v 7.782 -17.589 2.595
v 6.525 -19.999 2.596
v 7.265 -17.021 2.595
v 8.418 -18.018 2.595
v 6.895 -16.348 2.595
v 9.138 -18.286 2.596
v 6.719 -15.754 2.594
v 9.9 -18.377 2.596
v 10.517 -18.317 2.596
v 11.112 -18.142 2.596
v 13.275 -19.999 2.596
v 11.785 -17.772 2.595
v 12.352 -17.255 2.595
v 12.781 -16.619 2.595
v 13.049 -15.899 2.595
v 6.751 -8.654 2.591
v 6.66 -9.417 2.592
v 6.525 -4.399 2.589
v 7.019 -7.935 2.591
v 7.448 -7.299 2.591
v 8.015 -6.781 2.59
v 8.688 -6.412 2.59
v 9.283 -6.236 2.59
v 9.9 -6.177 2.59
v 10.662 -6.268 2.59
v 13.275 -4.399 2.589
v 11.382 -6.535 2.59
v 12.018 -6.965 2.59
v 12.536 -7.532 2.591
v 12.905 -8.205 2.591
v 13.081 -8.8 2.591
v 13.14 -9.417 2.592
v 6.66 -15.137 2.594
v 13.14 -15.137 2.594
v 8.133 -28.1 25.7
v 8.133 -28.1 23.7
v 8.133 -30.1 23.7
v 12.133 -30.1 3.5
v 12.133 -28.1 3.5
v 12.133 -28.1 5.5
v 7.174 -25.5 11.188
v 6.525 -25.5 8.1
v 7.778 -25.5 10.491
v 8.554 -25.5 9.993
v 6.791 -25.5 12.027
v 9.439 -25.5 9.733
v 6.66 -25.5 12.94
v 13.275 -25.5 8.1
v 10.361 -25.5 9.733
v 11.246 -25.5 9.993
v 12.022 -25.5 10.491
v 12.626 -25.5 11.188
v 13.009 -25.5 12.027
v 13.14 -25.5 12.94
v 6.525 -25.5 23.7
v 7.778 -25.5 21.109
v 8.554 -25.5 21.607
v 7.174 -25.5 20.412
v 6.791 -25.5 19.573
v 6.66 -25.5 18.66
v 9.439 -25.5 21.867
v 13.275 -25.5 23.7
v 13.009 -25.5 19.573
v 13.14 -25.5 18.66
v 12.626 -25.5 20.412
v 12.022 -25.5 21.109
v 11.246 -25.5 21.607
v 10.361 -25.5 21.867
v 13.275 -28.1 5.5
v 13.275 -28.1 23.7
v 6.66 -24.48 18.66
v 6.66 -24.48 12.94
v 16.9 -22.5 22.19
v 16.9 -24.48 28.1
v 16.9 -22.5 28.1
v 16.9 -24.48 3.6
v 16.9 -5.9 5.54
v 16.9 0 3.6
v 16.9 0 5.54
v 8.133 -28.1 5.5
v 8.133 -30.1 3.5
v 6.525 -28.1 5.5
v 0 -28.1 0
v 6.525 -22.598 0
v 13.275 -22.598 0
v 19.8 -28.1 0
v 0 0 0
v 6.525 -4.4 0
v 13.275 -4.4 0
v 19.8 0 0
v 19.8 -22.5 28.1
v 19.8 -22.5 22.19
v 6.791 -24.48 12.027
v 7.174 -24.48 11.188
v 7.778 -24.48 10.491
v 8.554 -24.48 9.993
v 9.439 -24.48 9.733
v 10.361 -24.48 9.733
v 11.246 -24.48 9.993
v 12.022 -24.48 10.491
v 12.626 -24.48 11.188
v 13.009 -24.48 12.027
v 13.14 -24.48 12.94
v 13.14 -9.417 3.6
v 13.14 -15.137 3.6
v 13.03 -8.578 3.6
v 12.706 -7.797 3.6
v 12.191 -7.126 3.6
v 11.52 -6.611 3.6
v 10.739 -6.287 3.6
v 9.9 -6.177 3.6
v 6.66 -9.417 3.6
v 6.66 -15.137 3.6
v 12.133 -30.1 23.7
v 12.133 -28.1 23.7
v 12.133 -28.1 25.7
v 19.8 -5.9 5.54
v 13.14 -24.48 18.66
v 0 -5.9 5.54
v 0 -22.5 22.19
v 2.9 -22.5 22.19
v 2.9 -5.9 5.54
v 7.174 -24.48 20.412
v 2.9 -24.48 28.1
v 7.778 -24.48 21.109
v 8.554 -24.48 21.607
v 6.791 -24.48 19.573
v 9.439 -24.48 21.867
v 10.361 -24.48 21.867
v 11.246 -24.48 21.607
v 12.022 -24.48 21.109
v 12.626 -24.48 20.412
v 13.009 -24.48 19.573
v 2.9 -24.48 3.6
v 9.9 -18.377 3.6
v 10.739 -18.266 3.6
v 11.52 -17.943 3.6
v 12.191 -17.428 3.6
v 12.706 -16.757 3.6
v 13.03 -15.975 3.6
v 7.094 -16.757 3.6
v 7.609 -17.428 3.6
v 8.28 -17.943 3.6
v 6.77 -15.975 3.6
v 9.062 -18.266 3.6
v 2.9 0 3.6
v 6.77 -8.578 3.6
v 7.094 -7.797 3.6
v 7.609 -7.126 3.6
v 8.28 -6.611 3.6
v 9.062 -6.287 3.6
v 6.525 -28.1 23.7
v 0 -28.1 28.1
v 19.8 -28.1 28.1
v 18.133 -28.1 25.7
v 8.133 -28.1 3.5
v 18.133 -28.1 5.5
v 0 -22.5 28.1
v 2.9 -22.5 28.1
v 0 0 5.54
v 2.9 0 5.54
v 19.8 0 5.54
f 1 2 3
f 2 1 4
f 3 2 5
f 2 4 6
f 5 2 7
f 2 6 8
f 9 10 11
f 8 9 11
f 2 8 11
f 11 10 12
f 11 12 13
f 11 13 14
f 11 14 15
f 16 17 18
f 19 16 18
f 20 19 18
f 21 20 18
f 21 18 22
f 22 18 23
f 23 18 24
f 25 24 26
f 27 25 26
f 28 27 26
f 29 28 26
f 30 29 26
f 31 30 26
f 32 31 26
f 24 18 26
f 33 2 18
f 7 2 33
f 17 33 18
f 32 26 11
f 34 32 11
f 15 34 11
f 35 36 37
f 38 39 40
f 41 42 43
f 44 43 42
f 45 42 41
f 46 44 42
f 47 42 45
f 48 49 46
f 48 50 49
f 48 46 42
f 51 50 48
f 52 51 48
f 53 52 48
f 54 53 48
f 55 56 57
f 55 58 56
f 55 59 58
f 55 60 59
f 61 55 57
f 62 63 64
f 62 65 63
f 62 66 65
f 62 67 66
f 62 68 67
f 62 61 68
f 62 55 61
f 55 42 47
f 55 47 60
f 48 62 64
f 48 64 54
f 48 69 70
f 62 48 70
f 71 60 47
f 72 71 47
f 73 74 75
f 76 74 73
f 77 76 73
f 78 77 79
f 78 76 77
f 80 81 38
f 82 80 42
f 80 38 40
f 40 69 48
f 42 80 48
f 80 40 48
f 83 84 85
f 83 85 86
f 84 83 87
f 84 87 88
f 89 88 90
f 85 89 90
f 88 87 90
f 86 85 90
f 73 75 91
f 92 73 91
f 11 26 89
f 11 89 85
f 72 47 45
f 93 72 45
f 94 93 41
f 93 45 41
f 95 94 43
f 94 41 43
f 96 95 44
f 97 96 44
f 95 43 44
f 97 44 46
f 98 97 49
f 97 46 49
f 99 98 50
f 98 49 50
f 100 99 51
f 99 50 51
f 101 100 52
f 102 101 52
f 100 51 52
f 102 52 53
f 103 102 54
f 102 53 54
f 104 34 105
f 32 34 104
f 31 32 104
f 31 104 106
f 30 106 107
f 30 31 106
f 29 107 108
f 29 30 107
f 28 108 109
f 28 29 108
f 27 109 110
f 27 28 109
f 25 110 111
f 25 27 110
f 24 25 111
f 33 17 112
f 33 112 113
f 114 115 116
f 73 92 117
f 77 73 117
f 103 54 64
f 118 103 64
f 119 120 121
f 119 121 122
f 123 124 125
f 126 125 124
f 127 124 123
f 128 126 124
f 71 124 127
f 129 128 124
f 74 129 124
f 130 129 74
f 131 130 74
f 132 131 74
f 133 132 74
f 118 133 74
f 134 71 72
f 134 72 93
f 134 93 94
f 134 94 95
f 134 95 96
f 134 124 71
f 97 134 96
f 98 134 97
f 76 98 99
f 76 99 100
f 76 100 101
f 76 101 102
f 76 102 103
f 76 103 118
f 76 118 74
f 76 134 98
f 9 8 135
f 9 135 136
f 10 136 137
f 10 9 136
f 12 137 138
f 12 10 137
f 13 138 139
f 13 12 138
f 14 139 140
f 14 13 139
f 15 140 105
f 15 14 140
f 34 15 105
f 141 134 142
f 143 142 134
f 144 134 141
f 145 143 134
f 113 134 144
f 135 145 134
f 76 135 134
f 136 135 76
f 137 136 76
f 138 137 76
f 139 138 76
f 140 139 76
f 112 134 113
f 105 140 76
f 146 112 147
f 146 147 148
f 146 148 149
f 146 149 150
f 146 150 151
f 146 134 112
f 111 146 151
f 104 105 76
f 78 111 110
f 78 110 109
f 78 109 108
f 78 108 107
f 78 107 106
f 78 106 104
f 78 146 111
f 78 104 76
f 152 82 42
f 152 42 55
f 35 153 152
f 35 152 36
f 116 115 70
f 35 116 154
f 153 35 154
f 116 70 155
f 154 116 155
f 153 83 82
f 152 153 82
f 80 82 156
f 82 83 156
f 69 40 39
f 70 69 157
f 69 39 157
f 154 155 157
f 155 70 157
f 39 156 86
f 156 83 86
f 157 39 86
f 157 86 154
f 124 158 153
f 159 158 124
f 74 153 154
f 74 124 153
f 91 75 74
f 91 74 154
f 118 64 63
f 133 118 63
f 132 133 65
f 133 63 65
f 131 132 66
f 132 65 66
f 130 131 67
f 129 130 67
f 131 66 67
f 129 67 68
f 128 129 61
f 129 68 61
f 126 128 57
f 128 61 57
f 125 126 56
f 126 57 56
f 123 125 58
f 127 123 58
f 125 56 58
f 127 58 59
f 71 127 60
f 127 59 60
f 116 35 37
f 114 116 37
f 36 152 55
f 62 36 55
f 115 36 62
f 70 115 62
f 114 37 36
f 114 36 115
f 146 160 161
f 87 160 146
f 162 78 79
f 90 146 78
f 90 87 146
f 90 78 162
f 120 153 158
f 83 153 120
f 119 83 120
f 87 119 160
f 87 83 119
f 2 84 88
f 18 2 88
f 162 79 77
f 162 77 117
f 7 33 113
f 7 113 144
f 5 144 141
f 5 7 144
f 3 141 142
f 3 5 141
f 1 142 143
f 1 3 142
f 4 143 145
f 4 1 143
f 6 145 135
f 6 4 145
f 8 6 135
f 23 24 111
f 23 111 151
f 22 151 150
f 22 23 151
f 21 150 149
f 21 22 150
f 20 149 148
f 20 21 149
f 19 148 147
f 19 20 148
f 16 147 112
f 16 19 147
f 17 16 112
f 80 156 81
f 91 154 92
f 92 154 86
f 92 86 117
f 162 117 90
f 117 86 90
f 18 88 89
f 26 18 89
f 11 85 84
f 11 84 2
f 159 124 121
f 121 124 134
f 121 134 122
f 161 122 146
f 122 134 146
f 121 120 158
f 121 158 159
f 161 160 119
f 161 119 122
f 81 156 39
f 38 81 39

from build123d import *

# Parameters (mm, degrees)
SKETCH_1_W          = 19.8
SKETCH_1_H          = 28.1
EXTRUDE_1_DEPTH     = 3.6
SKETCH_2_W          = 2.9
SKETCH_2_H          = 28.1
EXTRUDE_2_DEPTH     = 1.94
SKETCH_3_W          = 19.8
SKETCH_3_H          = 3.62
EXTRUDE_3_DEPTH     = 27.8
SKETCH_4_W          = 2.9
SKETCH_4_H          = 5.6
EXTRUDE_4_DEPTH     = 25.86
SKETCH_5_W          = 2.9
SKETCH_5_H          = 16.6
EXTRUDE_5_DEPTH     = 16.65
CUT_EXTRUDE_1_DEPTH = 3.3
CUT_EXTRUDE_2_DEPTH = 2.9
CUT_EXTRUDE_3_DEPTH = 2.9
SKETCH_11_W         = 6.75
SKETCH_11_H         = 15.6
CUT_EXTRUDE_4_DEPTH = 2.6
CUT_EXTRUDE_5_DEPTH = 6.75
CUT_EXTRUDE_6_DEPTH = 5
SKETCH_19_W         = 4
SKETCH_19_H         = 2
EXTRUDE_7_DEPTH     = 2
CUT_EXTRUDE_7_DEPTH = 10
CUT_EXTRUDE_8_DEPTH = 10


with BuildPart() as part:
    # 草图1 → 凸台-拉伸1 (new body)
    with BuildSketch(Plane.XY):
        with Locations((9.9, -14.05)):
            Rectangle(SKETCH_1_W, SKETCH_1_H)
    extrude(amount=EXTRUDE_1_DEPTH)

    # 草图2 → 凸台-拉伸2 (add)
    with BuildSketch(Plane.XY.offset(3.6)):
        with Locations((1.45, -14.05)):
            Rectangle(SKETCH_2_W, SKETCH_2_H)
        with Locations((18.35, -14.05)):
            Rectangle(SKETCH_2_W, SKETCH_2_H)
    extrude(amount=EXTRUDE_2_DEPTH)

    # 草图3 → 凸台-拉伸3 (add)
    with BuildSketch(Plane.XY.offset(3.6)):
        with Locations((9.9, -26.29)):
            Rectangle(SKETCH_3_W, SKETCH_3_H)
    extrude(amount=EXTRUDE_3_DEPTH)

    # 草图4 → 凸台-拉伸4 (add)
    with BuildSketch(Plane.XY.offset(5.54)):
        with Locations((1.45, -25.3)):
            Rectangle(SKETCH_4_W, SKETCH_4_H)
        with Locations((18.35, -25.3)):
            Rectangle(SKETCH_4_W, SKETCH_4_H)
    extrude(amount=EXTRUDE_4_DEPTH)

    # 草图5 → 凸台-拉伸5 (add)
    with BuildSketch(Plane.XY.offset(5.54)):
        with Locations((1.45, -14.2)):
            Rectangle(SKETCH_5_W, SKETCH_5_H)
        with Locations((18.35, -14.2)):
            Rectangle(SKETCH_5_W, SKETCH_5_H)
    extrude(amount=EXTRUDE_5_DEPTH)

    # 草图6 → 切除-拉伸1 (cut)
    with BuildSketch(Plane.XY.offset(31.4)):
        Polygon((0, -22.5), (0, -28.1), (19.8, -28.1), (19.8, -22.5), (16.9, -22.5), (16.9, -24.48), (2.9, -24.48), (2.9, -22.5), align=None)
    extrude(amount=-CUT_EXTRUDE_1_DEPTH, mode=Mode.SUBTRACT)

    # 草图9 → 切除-拉伸2 (cut)
    with BuildSketch(Plane.ZY):
        Polygon((5.54, -5.9), (22.19, -5.9), (22.19, -22.5), align=None)
    extrude(amount=-CUT_EXTRUDE_2_DEPTH, mode=Mode.SUBTRACT)

    # 草图10 → 切除-拉伸3 (cut)
    with BuildSketch(Plane(origin=(19.8, 0, 0), x_dir=(0, 0, -1), z_dir=(1, 0, 0))):
        Polygon((-5.54, -5.9), (-22.19, -5.9), (-22.19, -22.5), align=None)
    extrude(amount=-CUT_EXTRUDE_3_DEPTH, mode=Mode.SUBTRACT)

    # 草图11 → 切除-拉伸4 (cut)
    with BuildSketch(Plane.XZ.offset(28.1)):
        with Locations((9.9, 15.9)):
            Rectangle(SKETCH_11_W, SKETCH_11_H)
    cut_extrude_4 = extrude(amount=-CUT_EXTRUDE_4_DEPTH, mode=Mode.SUBTRACT)

    # 草图13 → 切除-拉伸5 (cut)
    with BuildSketch(Plane.ZY.offset(-13.275)):
        Polygon((8.1, -28.1), (5.5, -28.1), (8.1, -25.5), align=None)
    cut_extrude_5 = extrude(amount=CUT_EXTRUDE_5_DEPTH, mode=Mode.SUBTRACT)

    # 镜向1: 切除-拉伸4, 切除-拉伸5 across plane
    add(cut_extrude_4.mirror(Plane(origin=(0, -14.043669746, 14.049998574), x_dir=(0, 0.707266057, 0.706947469), z_dir=(0, -0.706947469, 0.707266057))), mode=Mode.SUBTRACT)
    add(cut_extrude_5.mirror(Plane(origin=(0, -14.043669746, 14.049998574), x_dir=(0, 0.707266057, 0.706947469), z_dir=(0, -0.706947469, 0.707266057))), mode=Mode.SUBTRACT)

    # 草图16 → 切除-拉伸6 (cut)
    with BuildSketch(Plane.XZ.offset(25.5)):
        with BuildLine():
            Line((6.66, 18.66), (6.66, 12.94))
            ThreePointArc((6.66, 12.94), (9.9, 9.7), (13.14, 12.94))
            Line((13.14, 12.94), (13.14, 18.66))
            ThreePointArc((13.14, 18.66), (9.9, 21.9), (6.66, 18.66))
        make_face()
    extrude(amount=-CUT_EXTRUDE_6_DEPTH, mode=Mode.SUBTRACT)

    # 草图19 → 凸台-拉伸7 (add)
    with BuildSketch(Plane.XZ.offset(28.1)):
        with Locations((10.132631834, 4.5)):
            Rectangle(SKETCH_19_W, SKETCH_19_H)
        with Locations((10.132631834, 24.7)):
            Rectangle(SKETCH_19_W, SKETCH_19_H)
    extrude(amount=EXTRUDE_7_DEPTH)

    # 草图21 → 切除-拉伸7 (cut)
    with BuildSketch(Plane.ZY.offset(-8.132631834)):
        Polygon((5.5, -28.1), (5.5, -30.1), (3.5, -30.1), align=None)
        Polygon((25.7, -28.1), (23.7, -30.1), (25.7, -30.1), align=None)
    extrude(amount=-CUT_EXTRUDE_7_DEPTH, mode=Mode.SUBTRACT)

    # 草图23 → 切除-拉伸8 (cut)
    with BuildSketch(Plane.XY):
        with BuildLine():
            ThreePointArc((13.140089886, -9.416749042), (12.191115857, -7.125723071), (9.900089886, -6.176749042))
            Line((9.900089886, -6.176749042), (9.900089886, -9.416749042))
            Line((9.900089886, -9.416749042), (9.900089886, -11.896749042))
            ThreePointArc((9.900089886, -11.896749042), (10.684691696, -11.993184187), (11.422587833, -12.276749042))
            ThreePointArc((11.422587833, -12.276749042), (12.677723172, -11.084787808), (13.140089886, -9.416749042))
        make_face()
        with BuildLine():
            Line((9.900089886, -9.416749042), (9.900089886, -6.176749042))
            ThreePointArc((9.900089886, -6.176749042), (7.609063915, -7.125723071), (6.660089886, -9.416749042))
            ThreePointArc((6.660089886, -9.416749042), (7.122456599, -11.084787808), (8.377591938, -12.276749042))
            ThreePointArc((8.377591938, -12.276749042), (9.115488076, -11.993184187), (9.900089886, -11.896749042))
            Line((9.900089886, -11.896749042), (9.900089886, -9.416749042))
        make_face()
        with BuildLine():
            ThreePointArc((13.140089886, -9.416749042), (12.191115857, -7.125723071), (9.900089886, -6.176749042))
            Line((9.900089886, -6.176749042), (9.900089886, -9.416749042))
            Line((9.900089886, -9.416749042), (9.900089886, -11.896749042))
            ThreePointArc((9.900089886, -11.896749042), (10.684691696, -11.993184187), (11.422587833, -12.276749042))
            ThreePointArc((11.422587833, -12.276749042), (12.677723172, -11.084787808), (13.140089886, -9.416749042))
        make_face()
        with BuildLine():
            Line((9.900089886, -9.416749042), (9.900089886, -6.176749042))
            ThreePointArc((9.900089886, -6.176749042), (7.609063915, -7.125723071), (6.660089886, -9.416749042))
            ThreePointArc((6.660089886, -9.416749042), (7.122456599, -11.084787808), (8.377591938, -12.276749042))
            ThreePointArc((8.377591938, -12.276749042), (9.115488076, -11.993184187), (9.900089886, -11.896749042))
            Line((9.900089886, -11.896749042), (9.900089886, -9.416749042))
        make_face()
        with BuildLine():
            ThreePointArc((6.660089886, -15.136749042), (7.609063915, -17.427775013), (9.900089886, -18.376749042))
            Line((9.900089886, -18.376749042), (9.900089886, -15.136749042))
            Line((9.900089886, -15.136749042), (9.900089886, -12.656749042))
            ThreePointArc((9.900089886, -12.656749042), (9.115488076, -12.560313898), (8.377591938, -12.276749042))
            ThreePointArc((8.377591938, -12.276749042), (7.122456599, -13.468710276), (6.660089886, -15.136749042))
        make_face()
        with BuildLine():
            Line((9.900089886, -15.136749042), (9.900089886, -18.376749042))
            ThreePointArc((9.900089886, -18.376749042), (12.191115857, -17.427775013), (13.140089886, -15.136749042))
            ThreePointArc((13.140089886, -15.136749042), (12.677723172, -13.468710276), (11.422587833, -12.276749042))
            ThreePointArc((11.422587833, -12.276749042), (10.684691696, -12.560313898), (9.900089886, -12.656749042))
            Line((9.900089886, -12.656749042), (9.900089886, -15.136749042))
        make_face()
        with BuildLine():
            ThreePointArc((11.422587833, -12.276749042), (10.684691696, -11.993184187), (9.900089886, -11.896749042))
            Line((9.900089886, -11.896749042), (9.900089886, -12.656749042))
            ThreePointArc((9.900089886, -12.656749042), (10.684691696, -12.560313898), (11.422587833, -12.276749042))
        make_face()
        with BuildLine():
            Line((9.900089886, -12.656749042), (9.900089886, -11.896749042))
            ThreePointArc((9.900089886, -11.896749042), (9.115488076, -11.993184187), (8.377591938, -12.276749042))
            ThreePointArc((8.377591938, -12.276749042), (9.115488076, -12.560313898), (9.900089886, -12.656749042))
        make_face()
        with BuildLine():
            ThreePointArc((13.140089886, -9.416749042), (12.191115857, -7.125723071), (9.900089886, -6.176749042))
            Line((9.900089886, -6.176749042), (9.900089886, -9.416749042))
            Line((9.900089886, -9.416749042), (9.900089886, -11.896749042))
            ThreePointArc((9.900089886, -11.896749042), (10.684691696, -11.993184187), (11.422587833, -12.276749042))
            ThreePointArc((11.422587833, -12.276749042), (12.677723172, -11.084787808), (13.140089886, -9.416749042))
        make_face()
        with BuildLine():
            Line((9.900089886, -9.416749042), (9.900089886, -6.176749042))
            ThreePointArc((9.900089886, -6.176749042), (7.609063915, -7.125723071), (6.660089886, -9.416749042))
            ThreePointArc((6.660089886, -9.416749042), (7.122456599, -11.084787808), (8.377591938, -12.276749042))
            ThreePointArc((8.377591938, -12.276749042), (9.115488076, -11.993184187), (9.900089886, -11.896749042))
            Line((9.900089886, -11.896749042), (9.900089886, -9.416749042))
        make_face()
        with BuildLine():
            ThreePointArc((6.660089886, -15.136749042), (7.609063915, -17.427775013), (9.900089886, -18.376749042))
            Line((9.900089886, -18.376749042), (9.900089886, -15.136749042))
            Line((9.900089886, -15.136749042), (9.900089886, -12.656749042))
            ThreePointArc((9.900089886, -12.656749042), (9.115488076, -12.560313898), (8.377591938, -12.276749042))
            ThreePointArc((8.377591938, -12.276749042), (7.122456599, -13.468710276), (6.660089886, -15.136749042))
        make_face()
        with BuildLine():
            Line((9.900089886, -15.136749042), (9.900089886, -18.376749042))
            ThreePointArc((9.900089886, -18.376749042), (12.191115857, -17.427775013), (13.140089886, -15.136749042))
            ThreePointArc((13.140089886, -15.136749042), (12.677723172, -13.468710276), (11.422587833, -12.276749042))
            ThreePointArc((11.422587833, -12.276749042), (10.684691696, -12.560313898), (9.900089886, -12.656749042))
            Line((9.900089886, -12.656749042), (9.900089886, -15.136749042))
        make_face()
        with BuildLine():
            ThreePointArc((11.422587833, -12.276749042), (10.684691696, -11.993184187), (9.900089886, -11.896749042))
            Line((9.900089886, -11.896749042), (9.900089886, -12.656749042))
            ThreePointArc((9.900089886, -12.656749042), (10.684691696, -12.560313898), (11.422587833, -12.276749042))
        make_face()
        with BuildLine():
            Line((9.900089886, -12.656749042), (9.900089886, -11.896749042))
            ThreePointArc((9.900089886, -11.896749042), (9.115488076, -11.993184187), (8.377591938, -12.276749042))
            ThreePointArc((8.377591938, -12.276749042), (9.115488076, -12.560313898), (9.900089886, -12.656749042))
        make_face()
        with BuildLine():
            ThreePointArc((13.140089886, -9.416749042), (12.191115857, -7.125723071), (9.900089886, -6.176749042))
            Line((9.900089886, -6.176749042), (9.900089886, -9.416749042))
            Line((9.900089886, -9.416749042), (9.900089886, -11.896749042))
            ThreePointArc((9.900089886, -11.896749042), (10.684691696, -11.993184187), (11.422587833, -12.276749042))
            ThreePointArc((11.422587833, -12.276749042), (12.677723172, -11.084787808), (13.140089886, -9.416749042))
        make_face()
        with BuildLine():
            Line((9.900089886, -9.416749042), (9.900089886, -6.176749042))
            ThreePointArc((9.900089886, -6.176749042), (7.609063915, -7.125723071), (6.660089886, -9.416749042))
            ThreePointArc((6.660089886, -9.416749042), (7.122456599, -11.084787808), (8.377591938, -12.276749042))
            ThreePointArc((8.377591938, -12.276749042), (9.115488076, -11.993184187), (9.900089886, -11.896749042))
            Line((9.900089886, -11.896749042), (9.900089886, -9.416749042))
        make_face()
        with BuildLine():
            ThreePointArc((6.660089886, -15.136749042), (7.609063915, -17.427775013), (9.900089886, -18.376749042))
            Line((9.900089886, -18.376749042), (9.900089886, -15.136749042))
            Line((9.900089886, -15.136749042), (9.900089886, -12.656749042))
            ThreePointArc((9.900089886, -12.656749042), (9.115488076, -12.560313898), (8.377591938, -12.276749042))
            ThreePointArc((8.377591938, -12.276749042), (7.122456599, -13.468710276), (6.660089886, -15.136749042))
        make_face()
        with BuildLine():
            Line((9.900089886, -15.136749042), (9.900089886, -18.376749042))
            ThreePointArc((9.900089886, -18.376749042), (12.191115857, -17.427775013), (13.140089886, -15.136749042))
            ThreePointArc((13.140089886, -15.136749042), (12.677723172, -13.468710276), (11.422587833, -12.276749042))
            ThreePointArc((11.422587833, -12.276749042), (10.684691696, -12.560313898), (9.900089886, -12.656749042))
            Line((9.900089886, -12.656749042), (9.900089886, -15.136749042))
        make_face()
        with BuildLine():
            ThreePointArc((11.422587833, -12.276749042), (10.684691696, -11.993184187), (9.900089886, -11.896749042))
            Line((9.900089886, -11.896749042), (9.900089886, -12.656749042))
            ThreePointArc((9.900089886, -12.656749042), (10.684691696, -12.560313898), (11.422587833, -12.276749042))
        make_face()
        with BuildLine():
            Line((9.900089886, -12.656749042), (9.900089886, -11.896749042))
            ThreePointArc((9.900089886, -11.896749042), (9.115488076, -11.993184187), (8.377591938, -12.276749042))
            ThreePointArc((8.377591938, -12.276749042), (9.115488076, -12.560313898), (9.900089886, -12.656749042))
        make_face()
        with BuildLine():
            ThreePointArc((13.140089886, -9.416749042), (12.191115857, -7.125723071), (9.900089886, -6.176749042))
            Line((9.900089886, -6.176749042), (9.900089886, -9.416749042))
            Line((9.900089886, -9.416749042), (9.900089886, -11.896749042))
            ThreePointArc((9.900089886, -11.896749042), (10.684691696, -11.993184187), (11.422587833, -12.276749042))
            ThreePointArc((11.422587833, -12.276749042), (12.677723172, -11.084787808), (13.140089886, -9.416749042))
        make_face()
        with BuildLine():
            Line((9.900089886, -9.416749042), (9.900089886, -6.176749042))
            ThreePointArc((9.900089886, -6.176749042), (7.609063915, -7.125723071), (6.660089886, -9.416749042))
            ThreePointArc((6.660089886, -9.416749042), (7.122456599, -11.084787808), (8.377591938, -12.276749042))
            ThreePointArc((8.377591938, -12.276749042), (9.115488076, -11.993184187), (9.900089886, -11.896749042))
            Line((9.900089886, -11.896749042), (9.900089886, -9.416749042))
        make_face()
        with BuildLine():
            ThreePointArc((13.140089886, -9.416749042), (12.191115857, -7.125723071), (9.900089886, -6.176749042))
            Line((9.900089886, -6.176749042), (9.900089886, -9.416749042))
            Line((9.900089886, -9.416749042), (9.900089886, -11.896749042))
            ThreePointArc((9.900089886, -11.896749042), (10.684691696, -11.993184187), (11.422587833, -12.276749042))
            ThreePointArc((11.422587833, -12.276749042), (12.677723172, -11.084787808), (13.140089886, -9.416749042))
        make_face()
        with BuildLine():
            Line((9.900089886, -9.416749042), (9.900089886, -6.176749042))
            ThreePointArc((9.900089886, -6.176749042), (7.609063915, -7.125723071), (6.660089886, -9.416749042))
            ThreePointArc((6.660089886, -9.416749042), (7.122456599, -11.084787808), (8.377591938, -12.276749042))
            ThreePointArc((8.377591938, -12.276749042), (9.115488076, -11.993184187), (9.900089886, -11.896749042))
            Line((9.900089886, -11.896749042), (9.900089886, -9.416749042))
        make_face()
        with BuildLine():
            ThreePointArc((6.660089886, -15.136749042), (7.609063915, -17.427775013), (9.900089886, -18.376749042))
            Line((9.900089886, -18.376749042), (9.900089886, -15.136749042))
            Line((9.900089886, -15.136749042), (9.900089886, -12.656749042))
            ThreePointArc((9.900089886, -12.656749042), (9.115488076, -12.560313898), (8.377591938, -12.276749042))
            ThreePointArc((8.377591938, -12.276749042), (7.122456599, -13.468710276), (6.660089886, -15.136749042))
        make_face()
        with BuildLine():
            Line((9.900089886, -15.136749042), (9.900089886, -18.376749042))
            ThreePointArc((9.900089886, -18.376749042), (12.191115857, -17.427775013), (13.140089886, -15.136749042))
            ThreePointArc((13.140089886, -15.136749042), (12.677723172, -13.468710276), (11.422587833, -12.276749042))
            ThreePointArc((11.422587833, -12.276749042), (10.684691696, -12.560313898), (9.900089886, -12.656749042))
            Line((9.900089886, -12.656749042), (9.900089886, -15.136749042))
        make_face()
        with BuildLine():
            ThreePointArc((11.422587833, -12.276749042), (10.684691696, -11.993184187), (9.900089886, -11.896749042))
            Line((9.900089886, -11.896749042), (9.900089886, -12.656749042))
            ThreePointArc((9.900089886, -12.656749042), (10.684691696, -12.560313898), (11.422587833, -12.276749042))
        make_face()
        with BuildLine():
            Line((9.900089886, -12.656749042), (9.900089886, -11.896749042))
            ThreePointArc((9.900089886, -11.896749042), (9.115488076, -11.993184187), (8.377591938, -12.276749042))
            ThreePointArc((8.377591938, -12.276749042), (9.115488076, -12.560313898), (9.900089886, -12.656749042))
        make_face()
        with BuildLine():
            Line((13.140089886, -15.136749042), (13.140089886, -9.416749042))
            ThreePointArc((13.140089886, -9.416749042), (12.677723172, -11.084787808), (11.422587833, -12.276749042))
            ThreePointArc((11.422587833, -12.276749042), (12.677723172, -13.468710276), (13.140089886, -15.136749042))
        make_face()
        with BuildLine():
            ThreePointArc((8.377591938, -12.276749042), (7.122456599, -11.084787808), (6.660089886, -9.416749042))
            Line((6.660089886, -9.416749042), (6.660089886, -15.136749042))
            ThreePointArc((6.660089886, -15.136749042), (7.122456599, -13.468710276), (8.377591938, -12.276749042))
        make_face()
    extrude(amount=CUT_EXTRUDE_8_DEPTH, mode=Mode.SUBTRACT)


solid = part.part
